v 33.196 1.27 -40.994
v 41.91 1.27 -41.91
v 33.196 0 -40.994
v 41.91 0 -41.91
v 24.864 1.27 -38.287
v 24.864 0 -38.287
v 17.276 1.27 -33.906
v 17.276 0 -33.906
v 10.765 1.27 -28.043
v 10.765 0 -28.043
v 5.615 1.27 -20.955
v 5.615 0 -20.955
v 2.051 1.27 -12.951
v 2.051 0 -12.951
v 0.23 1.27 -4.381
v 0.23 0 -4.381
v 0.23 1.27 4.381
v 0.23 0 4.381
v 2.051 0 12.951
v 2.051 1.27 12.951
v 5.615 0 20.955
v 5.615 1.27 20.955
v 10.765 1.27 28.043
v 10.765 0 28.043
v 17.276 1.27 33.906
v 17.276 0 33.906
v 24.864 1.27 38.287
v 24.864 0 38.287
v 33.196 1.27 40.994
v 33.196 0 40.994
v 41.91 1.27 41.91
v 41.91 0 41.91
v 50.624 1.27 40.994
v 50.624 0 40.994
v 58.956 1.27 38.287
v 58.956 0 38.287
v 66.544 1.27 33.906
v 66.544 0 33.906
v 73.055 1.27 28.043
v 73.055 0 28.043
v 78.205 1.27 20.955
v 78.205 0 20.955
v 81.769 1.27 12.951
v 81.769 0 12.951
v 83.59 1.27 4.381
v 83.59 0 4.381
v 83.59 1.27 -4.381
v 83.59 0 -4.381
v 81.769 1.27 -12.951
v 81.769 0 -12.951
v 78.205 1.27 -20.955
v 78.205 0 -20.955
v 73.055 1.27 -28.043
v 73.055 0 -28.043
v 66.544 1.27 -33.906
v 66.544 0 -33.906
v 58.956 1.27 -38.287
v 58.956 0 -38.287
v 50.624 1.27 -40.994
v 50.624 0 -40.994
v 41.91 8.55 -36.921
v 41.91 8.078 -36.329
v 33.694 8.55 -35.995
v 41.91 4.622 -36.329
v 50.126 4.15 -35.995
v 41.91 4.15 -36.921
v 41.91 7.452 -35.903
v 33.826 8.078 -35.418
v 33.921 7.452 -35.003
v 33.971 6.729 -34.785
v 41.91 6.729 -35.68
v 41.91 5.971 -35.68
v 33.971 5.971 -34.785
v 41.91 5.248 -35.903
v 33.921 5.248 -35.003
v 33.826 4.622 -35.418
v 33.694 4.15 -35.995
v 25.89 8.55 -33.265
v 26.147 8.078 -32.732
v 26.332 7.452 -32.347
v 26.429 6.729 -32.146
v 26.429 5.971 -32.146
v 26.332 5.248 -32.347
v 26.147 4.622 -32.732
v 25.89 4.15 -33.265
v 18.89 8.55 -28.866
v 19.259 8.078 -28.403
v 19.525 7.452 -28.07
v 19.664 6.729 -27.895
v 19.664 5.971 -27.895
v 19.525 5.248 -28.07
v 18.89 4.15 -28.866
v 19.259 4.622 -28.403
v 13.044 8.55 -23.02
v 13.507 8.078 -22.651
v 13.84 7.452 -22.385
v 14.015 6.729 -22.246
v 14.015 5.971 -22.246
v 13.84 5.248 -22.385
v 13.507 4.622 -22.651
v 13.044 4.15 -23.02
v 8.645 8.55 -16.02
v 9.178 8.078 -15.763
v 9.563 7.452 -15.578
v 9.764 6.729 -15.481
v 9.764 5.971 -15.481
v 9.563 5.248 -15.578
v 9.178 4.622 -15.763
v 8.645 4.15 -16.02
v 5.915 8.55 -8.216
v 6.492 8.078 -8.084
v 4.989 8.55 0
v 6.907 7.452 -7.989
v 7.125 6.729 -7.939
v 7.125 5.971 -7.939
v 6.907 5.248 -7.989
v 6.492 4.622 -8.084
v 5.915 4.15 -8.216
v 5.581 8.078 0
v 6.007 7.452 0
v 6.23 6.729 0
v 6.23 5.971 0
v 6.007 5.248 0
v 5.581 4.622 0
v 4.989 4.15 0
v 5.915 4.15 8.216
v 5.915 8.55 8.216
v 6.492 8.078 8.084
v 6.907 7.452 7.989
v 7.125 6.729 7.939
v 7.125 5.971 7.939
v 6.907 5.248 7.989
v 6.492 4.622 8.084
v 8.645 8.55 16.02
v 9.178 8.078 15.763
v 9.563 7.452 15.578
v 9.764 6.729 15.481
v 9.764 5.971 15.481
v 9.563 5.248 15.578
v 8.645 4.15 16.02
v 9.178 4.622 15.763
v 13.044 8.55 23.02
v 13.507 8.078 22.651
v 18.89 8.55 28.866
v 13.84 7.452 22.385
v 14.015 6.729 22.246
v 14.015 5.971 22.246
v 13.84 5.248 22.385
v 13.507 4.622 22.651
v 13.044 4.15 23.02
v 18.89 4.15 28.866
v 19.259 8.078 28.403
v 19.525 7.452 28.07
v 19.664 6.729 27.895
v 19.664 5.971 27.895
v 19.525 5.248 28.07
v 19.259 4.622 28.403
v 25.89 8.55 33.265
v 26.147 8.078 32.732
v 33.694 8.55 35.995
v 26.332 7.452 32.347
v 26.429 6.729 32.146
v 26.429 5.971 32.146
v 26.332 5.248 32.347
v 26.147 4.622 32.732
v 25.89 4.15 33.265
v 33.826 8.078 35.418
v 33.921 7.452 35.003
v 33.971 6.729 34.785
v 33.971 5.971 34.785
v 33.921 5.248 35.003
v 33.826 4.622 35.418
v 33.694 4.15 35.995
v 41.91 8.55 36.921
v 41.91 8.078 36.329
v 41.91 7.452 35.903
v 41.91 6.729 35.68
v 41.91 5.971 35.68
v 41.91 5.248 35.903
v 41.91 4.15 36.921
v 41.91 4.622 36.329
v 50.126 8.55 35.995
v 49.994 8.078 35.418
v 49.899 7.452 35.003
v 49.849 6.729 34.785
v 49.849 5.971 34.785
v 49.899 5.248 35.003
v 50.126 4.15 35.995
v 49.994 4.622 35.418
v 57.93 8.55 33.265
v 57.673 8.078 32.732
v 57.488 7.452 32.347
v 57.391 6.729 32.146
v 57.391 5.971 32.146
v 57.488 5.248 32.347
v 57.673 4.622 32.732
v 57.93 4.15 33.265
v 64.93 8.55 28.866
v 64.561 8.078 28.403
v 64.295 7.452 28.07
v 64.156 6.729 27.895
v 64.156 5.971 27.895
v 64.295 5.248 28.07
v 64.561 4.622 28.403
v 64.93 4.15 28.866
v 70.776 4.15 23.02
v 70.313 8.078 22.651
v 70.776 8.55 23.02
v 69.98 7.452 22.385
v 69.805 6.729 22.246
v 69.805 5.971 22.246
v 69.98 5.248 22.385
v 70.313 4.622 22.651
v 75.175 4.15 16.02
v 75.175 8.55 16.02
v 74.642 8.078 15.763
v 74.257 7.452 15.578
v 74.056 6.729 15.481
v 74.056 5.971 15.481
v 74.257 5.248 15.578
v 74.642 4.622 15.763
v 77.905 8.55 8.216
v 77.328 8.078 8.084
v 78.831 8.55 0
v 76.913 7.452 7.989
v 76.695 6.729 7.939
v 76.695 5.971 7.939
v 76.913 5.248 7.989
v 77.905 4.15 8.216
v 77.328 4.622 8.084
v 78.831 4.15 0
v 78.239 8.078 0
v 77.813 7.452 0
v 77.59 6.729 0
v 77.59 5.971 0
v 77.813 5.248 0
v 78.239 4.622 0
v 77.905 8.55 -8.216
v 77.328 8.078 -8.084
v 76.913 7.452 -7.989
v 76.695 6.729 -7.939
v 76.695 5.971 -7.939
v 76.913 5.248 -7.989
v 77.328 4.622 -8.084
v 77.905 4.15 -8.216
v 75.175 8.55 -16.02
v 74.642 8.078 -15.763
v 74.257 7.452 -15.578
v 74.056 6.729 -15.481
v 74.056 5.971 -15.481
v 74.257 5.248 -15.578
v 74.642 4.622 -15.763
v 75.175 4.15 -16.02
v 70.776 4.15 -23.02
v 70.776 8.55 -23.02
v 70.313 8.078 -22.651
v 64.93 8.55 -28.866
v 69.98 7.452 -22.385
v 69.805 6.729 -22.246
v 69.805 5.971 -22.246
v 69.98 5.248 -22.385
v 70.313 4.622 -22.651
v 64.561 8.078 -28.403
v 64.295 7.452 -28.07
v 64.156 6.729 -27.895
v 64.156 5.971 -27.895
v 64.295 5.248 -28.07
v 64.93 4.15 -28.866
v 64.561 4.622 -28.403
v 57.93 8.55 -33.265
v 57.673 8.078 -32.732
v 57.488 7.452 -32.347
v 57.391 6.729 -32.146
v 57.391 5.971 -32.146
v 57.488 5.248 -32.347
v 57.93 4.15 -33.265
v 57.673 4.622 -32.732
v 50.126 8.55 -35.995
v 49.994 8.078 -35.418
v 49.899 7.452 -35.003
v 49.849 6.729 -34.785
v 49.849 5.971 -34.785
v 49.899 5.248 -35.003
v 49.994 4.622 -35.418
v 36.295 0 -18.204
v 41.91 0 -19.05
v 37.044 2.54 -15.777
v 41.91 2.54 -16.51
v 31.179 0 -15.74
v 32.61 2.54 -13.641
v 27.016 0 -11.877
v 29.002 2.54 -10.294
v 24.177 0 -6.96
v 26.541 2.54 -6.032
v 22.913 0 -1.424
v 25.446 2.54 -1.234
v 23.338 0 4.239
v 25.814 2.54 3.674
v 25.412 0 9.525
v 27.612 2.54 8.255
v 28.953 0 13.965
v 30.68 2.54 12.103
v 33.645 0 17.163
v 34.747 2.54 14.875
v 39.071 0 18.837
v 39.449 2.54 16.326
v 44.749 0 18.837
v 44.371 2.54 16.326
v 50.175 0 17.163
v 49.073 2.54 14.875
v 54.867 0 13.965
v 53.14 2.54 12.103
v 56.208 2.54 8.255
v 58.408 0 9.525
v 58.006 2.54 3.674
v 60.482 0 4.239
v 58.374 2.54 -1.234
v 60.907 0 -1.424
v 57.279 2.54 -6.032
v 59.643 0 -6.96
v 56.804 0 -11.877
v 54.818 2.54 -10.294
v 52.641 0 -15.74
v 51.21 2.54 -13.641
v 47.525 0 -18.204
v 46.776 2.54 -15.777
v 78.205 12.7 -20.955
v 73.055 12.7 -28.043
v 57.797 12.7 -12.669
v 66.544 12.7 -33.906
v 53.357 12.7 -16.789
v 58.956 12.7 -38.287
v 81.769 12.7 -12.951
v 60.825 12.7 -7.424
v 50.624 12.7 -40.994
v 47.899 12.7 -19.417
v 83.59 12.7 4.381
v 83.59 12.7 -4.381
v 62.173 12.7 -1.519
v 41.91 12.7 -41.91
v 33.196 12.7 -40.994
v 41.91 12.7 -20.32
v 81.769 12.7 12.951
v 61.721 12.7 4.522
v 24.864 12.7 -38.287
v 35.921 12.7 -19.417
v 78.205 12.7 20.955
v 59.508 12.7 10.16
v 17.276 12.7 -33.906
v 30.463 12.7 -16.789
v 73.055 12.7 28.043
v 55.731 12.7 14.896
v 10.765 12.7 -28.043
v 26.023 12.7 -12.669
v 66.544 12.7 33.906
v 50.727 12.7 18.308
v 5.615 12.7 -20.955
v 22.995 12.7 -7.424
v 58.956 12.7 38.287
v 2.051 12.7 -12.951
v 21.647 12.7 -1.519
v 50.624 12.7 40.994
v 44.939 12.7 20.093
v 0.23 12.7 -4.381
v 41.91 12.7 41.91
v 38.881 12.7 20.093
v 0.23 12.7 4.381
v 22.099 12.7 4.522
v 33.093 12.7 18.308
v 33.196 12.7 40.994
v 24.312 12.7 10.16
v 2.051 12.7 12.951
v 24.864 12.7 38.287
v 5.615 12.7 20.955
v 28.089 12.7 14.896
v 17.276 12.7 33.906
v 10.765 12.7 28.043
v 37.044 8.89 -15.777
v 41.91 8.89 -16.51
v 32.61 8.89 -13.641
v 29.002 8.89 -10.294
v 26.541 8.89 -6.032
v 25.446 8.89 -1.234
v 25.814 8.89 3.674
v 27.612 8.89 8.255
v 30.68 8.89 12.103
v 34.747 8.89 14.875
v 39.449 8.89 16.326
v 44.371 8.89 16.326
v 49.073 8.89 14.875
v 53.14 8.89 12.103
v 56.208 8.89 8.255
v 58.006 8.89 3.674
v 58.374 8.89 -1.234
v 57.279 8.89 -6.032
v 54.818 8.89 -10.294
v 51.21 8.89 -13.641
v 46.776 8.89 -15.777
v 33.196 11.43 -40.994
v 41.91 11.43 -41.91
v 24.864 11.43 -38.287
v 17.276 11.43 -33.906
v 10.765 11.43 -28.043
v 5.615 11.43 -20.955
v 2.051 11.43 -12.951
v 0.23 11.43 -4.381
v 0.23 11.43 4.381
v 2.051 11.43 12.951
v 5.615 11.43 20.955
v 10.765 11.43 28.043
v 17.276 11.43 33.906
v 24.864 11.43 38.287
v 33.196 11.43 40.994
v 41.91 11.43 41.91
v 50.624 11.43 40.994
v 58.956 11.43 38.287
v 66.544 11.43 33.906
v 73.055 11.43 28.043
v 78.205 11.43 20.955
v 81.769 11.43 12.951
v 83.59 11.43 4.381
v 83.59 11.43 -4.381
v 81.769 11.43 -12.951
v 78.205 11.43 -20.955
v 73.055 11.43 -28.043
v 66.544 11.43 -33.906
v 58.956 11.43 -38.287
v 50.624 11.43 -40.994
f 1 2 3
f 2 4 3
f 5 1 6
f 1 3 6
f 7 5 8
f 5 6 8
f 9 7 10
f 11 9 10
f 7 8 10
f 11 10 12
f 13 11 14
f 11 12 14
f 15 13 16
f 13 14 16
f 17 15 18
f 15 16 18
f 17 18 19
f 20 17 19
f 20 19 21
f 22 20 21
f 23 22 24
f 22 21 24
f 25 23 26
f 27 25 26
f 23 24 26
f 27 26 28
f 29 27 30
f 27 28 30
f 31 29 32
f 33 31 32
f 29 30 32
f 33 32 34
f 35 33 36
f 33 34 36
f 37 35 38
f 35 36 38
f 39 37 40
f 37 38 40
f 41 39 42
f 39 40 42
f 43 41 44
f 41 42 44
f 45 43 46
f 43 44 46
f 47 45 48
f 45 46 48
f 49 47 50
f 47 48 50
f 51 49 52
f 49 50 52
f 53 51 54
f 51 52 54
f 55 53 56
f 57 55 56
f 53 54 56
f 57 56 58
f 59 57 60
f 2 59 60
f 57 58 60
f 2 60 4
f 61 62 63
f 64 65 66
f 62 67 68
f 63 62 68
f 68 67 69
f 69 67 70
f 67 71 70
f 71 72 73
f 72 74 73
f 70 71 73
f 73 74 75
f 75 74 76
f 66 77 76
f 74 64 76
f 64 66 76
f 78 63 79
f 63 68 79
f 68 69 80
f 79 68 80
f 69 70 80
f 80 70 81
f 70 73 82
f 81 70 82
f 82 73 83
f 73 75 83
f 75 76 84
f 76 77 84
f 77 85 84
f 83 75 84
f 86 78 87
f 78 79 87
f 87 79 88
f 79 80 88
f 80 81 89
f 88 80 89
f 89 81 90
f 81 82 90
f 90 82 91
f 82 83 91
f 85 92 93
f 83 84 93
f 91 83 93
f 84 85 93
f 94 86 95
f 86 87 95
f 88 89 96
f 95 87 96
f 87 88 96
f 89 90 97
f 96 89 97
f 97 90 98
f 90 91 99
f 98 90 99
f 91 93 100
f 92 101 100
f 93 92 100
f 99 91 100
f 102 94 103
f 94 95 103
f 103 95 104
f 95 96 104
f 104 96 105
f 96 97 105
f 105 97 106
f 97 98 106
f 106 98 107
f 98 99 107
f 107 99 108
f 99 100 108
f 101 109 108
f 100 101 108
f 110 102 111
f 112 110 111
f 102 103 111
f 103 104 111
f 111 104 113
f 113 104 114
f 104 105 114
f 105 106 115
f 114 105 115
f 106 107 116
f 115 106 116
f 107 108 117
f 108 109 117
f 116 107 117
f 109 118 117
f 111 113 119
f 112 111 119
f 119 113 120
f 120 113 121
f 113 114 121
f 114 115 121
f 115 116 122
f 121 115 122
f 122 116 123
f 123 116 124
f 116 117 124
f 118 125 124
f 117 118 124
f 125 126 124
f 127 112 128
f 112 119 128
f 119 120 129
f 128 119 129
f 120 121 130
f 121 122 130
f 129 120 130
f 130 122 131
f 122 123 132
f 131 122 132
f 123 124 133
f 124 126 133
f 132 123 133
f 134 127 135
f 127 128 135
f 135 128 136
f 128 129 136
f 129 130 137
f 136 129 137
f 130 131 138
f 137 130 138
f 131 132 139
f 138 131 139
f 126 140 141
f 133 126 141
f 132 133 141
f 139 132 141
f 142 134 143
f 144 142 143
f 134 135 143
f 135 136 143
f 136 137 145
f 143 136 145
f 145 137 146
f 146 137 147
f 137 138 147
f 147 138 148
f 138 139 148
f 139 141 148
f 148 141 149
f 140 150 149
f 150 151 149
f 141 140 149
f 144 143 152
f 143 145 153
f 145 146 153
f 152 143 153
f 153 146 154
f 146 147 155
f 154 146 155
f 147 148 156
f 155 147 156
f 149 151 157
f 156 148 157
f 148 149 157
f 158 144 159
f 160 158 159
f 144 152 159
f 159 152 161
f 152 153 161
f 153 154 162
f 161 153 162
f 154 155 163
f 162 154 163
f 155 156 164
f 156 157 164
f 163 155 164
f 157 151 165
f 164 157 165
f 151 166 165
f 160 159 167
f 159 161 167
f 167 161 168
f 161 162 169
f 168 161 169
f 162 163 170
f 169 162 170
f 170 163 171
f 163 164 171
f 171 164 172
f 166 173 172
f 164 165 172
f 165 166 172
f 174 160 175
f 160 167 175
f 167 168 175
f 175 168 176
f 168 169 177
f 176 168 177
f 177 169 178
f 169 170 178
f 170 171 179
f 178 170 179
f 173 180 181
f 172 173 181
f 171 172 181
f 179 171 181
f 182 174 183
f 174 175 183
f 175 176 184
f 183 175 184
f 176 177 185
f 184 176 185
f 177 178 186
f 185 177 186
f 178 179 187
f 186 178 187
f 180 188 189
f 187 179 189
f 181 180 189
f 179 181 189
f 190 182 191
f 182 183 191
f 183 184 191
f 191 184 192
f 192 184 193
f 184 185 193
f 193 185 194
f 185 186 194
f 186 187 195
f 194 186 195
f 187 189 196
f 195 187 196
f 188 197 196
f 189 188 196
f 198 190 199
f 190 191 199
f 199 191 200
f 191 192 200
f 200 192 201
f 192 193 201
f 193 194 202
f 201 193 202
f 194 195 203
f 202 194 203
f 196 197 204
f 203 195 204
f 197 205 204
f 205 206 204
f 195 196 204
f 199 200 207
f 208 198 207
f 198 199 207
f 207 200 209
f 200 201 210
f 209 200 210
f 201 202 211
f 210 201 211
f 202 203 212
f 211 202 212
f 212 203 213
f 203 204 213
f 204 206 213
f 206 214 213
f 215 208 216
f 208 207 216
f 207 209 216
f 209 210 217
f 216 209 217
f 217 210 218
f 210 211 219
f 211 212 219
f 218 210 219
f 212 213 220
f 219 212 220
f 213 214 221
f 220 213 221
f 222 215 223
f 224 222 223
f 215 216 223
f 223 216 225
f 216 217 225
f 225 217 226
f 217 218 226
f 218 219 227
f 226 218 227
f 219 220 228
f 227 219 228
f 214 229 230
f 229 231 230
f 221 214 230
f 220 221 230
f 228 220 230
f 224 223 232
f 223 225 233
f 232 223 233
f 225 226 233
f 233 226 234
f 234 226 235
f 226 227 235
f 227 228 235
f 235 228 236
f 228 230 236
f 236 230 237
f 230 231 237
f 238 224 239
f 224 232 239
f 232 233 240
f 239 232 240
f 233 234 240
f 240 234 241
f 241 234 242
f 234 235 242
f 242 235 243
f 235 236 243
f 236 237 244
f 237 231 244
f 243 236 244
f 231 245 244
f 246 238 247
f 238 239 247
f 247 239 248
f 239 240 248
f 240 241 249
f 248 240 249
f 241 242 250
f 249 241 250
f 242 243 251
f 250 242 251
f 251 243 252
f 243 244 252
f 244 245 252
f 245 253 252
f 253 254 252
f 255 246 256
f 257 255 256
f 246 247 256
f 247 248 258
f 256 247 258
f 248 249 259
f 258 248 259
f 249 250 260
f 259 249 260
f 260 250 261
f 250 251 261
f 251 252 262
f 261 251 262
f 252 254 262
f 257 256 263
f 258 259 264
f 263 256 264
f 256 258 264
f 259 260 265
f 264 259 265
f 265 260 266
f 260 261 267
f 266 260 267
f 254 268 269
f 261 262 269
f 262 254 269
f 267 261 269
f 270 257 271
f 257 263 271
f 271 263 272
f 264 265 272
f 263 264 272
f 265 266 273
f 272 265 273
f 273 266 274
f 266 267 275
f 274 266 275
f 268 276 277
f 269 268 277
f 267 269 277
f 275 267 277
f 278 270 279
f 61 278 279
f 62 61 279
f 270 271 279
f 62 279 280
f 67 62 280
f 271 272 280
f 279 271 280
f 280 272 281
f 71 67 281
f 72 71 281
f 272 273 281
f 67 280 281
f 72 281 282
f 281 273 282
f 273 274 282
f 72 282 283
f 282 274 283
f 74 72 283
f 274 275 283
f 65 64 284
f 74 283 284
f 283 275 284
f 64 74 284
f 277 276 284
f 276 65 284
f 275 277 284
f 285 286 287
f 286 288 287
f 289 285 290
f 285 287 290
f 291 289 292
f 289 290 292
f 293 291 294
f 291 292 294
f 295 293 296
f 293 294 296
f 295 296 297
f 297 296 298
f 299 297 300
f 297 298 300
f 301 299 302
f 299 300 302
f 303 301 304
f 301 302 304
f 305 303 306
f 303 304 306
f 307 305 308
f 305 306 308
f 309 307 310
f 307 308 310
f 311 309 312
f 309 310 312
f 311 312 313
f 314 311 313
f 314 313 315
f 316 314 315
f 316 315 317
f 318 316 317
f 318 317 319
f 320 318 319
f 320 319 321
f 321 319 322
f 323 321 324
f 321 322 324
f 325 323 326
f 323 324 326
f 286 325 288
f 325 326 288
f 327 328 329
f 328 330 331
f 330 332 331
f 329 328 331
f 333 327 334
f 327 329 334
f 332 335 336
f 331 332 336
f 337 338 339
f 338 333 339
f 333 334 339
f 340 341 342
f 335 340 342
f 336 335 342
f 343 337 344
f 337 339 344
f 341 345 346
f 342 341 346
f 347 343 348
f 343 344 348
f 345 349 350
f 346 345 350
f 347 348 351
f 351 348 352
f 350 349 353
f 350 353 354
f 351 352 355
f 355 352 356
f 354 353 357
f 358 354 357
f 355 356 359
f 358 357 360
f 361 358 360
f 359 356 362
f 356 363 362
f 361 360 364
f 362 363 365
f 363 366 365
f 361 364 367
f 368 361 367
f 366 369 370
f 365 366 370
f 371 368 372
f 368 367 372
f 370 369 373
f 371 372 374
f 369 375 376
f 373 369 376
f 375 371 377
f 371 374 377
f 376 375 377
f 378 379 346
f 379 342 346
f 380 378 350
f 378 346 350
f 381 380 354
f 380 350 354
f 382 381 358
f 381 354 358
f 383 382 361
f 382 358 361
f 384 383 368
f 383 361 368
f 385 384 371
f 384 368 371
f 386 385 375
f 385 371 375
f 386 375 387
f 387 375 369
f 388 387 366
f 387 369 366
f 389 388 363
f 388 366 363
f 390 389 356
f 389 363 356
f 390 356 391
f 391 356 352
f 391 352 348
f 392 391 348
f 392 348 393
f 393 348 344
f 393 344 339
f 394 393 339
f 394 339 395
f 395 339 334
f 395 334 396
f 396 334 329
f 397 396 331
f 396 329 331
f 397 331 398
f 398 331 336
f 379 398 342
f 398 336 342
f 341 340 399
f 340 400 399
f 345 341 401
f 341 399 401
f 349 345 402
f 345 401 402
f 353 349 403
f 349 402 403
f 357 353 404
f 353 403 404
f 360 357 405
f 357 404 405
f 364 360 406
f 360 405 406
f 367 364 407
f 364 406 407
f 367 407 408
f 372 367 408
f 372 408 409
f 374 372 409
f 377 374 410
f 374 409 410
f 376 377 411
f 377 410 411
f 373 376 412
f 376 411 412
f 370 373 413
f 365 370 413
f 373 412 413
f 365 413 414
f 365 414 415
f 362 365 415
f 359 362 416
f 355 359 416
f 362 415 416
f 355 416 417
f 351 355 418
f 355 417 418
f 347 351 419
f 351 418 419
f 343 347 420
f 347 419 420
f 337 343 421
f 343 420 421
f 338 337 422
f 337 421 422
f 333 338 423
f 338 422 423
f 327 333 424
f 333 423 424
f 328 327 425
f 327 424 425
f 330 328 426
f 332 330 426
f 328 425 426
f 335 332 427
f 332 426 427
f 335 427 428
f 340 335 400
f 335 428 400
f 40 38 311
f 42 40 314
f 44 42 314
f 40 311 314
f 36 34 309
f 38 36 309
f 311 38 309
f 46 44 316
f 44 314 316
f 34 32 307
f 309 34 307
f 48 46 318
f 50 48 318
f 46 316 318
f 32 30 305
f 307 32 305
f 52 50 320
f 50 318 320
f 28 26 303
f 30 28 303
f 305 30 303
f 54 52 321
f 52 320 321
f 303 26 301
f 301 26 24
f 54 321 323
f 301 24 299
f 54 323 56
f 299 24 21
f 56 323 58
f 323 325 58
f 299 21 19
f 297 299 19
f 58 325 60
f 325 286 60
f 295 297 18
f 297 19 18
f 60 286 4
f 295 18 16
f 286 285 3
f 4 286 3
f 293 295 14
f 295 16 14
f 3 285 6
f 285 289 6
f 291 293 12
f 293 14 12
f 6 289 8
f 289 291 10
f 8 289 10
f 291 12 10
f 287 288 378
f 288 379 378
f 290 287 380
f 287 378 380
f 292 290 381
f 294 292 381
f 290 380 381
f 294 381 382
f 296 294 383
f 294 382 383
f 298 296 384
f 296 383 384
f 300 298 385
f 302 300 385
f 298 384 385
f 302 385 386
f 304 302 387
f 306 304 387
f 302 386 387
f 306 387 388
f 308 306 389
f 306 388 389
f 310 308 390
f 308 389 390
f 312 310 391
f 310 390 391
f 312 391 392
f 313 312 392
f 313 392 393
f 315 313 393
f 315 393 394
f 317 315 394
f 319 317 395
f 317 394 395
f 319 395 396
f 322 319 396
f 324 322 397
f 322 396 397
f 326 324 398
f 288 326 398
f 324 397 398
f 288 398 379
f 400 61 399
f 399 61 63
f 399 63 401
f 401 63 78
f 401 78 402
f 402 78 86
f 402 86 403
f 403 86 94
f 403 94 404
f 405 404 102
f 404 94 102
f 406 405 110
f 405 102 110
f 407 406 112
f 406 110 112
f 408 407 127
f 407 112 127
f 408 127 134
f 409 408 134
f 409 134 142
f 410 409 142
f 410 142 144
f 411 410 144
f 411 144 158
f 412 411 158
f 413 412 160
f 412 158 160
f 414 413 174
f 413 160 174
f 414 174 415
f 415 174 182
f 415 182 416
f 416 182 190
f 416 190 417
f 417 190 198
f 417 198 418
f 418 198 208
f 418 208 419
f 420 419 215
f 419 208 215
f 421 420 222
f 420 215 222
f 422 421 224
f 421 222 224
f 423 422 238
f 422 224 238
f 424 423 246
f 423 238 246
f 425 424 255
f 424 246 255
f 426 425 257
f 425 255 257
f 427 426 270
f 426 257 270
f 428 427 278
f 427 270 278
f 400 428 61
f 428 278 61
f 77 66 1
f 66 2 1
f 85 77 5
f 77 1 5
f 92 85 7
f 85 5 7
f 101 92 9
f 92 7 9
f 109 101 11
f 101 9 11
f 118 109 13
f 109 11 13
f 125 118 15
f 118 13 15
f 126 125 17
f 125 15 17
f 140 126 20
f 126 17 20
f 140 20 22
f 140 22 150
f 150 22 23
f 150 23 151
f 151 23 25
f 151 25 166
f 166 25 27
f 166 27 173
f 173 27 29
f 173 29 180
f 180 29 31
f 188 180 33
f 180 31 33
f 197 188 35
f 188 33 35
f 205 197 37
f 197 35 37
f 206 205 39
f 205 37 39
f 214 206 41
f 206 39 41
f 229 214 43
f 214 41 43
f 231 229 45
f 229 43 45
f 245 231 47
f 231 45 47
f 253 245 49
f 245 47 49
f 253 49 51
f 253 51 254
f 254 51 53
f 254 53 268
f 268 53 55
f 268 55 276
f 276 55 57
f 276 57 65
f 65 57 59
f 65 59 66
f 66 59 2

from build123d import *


with BuildPart() as part:
    # Sketch1 → Revolve3 (revolve)
    with BuildSketch(Plane.XY, mode=Mode.PRIVATE) as revolve3_sk:
        with BuildLine():
            Line((0, 0), (22.86, 0))
            Line((22.86, 0), (25.4, 2.54))
            Line((25.4, 2.54), (25.4, 8.89))
            Line((25.4, 8.89), (21.59, 12.7))
            Line((21.59, 12.7), (0, 12.7))
            Line((0, 12.7), (0, 11.43))
            Line((0, 11.43), (4.988818102, 8.549704526))
            ThreePointArc((4.988818102, 8.549704526), (6.258818102, 6.35), (4.988818102, 4.150295474))
            Line((4.988818102, 4.150295474), (0, 1.27))
            Line((0, 1.27), (0, 0))
        make_face()
    revolve(revolve3_sk.sketch.rotate(Axis((41.91, 0, 0), (0, 1, 0)), 270), axis=Axis((41.91, 0, 0), (0, 1, 0)))


solid = part.part
